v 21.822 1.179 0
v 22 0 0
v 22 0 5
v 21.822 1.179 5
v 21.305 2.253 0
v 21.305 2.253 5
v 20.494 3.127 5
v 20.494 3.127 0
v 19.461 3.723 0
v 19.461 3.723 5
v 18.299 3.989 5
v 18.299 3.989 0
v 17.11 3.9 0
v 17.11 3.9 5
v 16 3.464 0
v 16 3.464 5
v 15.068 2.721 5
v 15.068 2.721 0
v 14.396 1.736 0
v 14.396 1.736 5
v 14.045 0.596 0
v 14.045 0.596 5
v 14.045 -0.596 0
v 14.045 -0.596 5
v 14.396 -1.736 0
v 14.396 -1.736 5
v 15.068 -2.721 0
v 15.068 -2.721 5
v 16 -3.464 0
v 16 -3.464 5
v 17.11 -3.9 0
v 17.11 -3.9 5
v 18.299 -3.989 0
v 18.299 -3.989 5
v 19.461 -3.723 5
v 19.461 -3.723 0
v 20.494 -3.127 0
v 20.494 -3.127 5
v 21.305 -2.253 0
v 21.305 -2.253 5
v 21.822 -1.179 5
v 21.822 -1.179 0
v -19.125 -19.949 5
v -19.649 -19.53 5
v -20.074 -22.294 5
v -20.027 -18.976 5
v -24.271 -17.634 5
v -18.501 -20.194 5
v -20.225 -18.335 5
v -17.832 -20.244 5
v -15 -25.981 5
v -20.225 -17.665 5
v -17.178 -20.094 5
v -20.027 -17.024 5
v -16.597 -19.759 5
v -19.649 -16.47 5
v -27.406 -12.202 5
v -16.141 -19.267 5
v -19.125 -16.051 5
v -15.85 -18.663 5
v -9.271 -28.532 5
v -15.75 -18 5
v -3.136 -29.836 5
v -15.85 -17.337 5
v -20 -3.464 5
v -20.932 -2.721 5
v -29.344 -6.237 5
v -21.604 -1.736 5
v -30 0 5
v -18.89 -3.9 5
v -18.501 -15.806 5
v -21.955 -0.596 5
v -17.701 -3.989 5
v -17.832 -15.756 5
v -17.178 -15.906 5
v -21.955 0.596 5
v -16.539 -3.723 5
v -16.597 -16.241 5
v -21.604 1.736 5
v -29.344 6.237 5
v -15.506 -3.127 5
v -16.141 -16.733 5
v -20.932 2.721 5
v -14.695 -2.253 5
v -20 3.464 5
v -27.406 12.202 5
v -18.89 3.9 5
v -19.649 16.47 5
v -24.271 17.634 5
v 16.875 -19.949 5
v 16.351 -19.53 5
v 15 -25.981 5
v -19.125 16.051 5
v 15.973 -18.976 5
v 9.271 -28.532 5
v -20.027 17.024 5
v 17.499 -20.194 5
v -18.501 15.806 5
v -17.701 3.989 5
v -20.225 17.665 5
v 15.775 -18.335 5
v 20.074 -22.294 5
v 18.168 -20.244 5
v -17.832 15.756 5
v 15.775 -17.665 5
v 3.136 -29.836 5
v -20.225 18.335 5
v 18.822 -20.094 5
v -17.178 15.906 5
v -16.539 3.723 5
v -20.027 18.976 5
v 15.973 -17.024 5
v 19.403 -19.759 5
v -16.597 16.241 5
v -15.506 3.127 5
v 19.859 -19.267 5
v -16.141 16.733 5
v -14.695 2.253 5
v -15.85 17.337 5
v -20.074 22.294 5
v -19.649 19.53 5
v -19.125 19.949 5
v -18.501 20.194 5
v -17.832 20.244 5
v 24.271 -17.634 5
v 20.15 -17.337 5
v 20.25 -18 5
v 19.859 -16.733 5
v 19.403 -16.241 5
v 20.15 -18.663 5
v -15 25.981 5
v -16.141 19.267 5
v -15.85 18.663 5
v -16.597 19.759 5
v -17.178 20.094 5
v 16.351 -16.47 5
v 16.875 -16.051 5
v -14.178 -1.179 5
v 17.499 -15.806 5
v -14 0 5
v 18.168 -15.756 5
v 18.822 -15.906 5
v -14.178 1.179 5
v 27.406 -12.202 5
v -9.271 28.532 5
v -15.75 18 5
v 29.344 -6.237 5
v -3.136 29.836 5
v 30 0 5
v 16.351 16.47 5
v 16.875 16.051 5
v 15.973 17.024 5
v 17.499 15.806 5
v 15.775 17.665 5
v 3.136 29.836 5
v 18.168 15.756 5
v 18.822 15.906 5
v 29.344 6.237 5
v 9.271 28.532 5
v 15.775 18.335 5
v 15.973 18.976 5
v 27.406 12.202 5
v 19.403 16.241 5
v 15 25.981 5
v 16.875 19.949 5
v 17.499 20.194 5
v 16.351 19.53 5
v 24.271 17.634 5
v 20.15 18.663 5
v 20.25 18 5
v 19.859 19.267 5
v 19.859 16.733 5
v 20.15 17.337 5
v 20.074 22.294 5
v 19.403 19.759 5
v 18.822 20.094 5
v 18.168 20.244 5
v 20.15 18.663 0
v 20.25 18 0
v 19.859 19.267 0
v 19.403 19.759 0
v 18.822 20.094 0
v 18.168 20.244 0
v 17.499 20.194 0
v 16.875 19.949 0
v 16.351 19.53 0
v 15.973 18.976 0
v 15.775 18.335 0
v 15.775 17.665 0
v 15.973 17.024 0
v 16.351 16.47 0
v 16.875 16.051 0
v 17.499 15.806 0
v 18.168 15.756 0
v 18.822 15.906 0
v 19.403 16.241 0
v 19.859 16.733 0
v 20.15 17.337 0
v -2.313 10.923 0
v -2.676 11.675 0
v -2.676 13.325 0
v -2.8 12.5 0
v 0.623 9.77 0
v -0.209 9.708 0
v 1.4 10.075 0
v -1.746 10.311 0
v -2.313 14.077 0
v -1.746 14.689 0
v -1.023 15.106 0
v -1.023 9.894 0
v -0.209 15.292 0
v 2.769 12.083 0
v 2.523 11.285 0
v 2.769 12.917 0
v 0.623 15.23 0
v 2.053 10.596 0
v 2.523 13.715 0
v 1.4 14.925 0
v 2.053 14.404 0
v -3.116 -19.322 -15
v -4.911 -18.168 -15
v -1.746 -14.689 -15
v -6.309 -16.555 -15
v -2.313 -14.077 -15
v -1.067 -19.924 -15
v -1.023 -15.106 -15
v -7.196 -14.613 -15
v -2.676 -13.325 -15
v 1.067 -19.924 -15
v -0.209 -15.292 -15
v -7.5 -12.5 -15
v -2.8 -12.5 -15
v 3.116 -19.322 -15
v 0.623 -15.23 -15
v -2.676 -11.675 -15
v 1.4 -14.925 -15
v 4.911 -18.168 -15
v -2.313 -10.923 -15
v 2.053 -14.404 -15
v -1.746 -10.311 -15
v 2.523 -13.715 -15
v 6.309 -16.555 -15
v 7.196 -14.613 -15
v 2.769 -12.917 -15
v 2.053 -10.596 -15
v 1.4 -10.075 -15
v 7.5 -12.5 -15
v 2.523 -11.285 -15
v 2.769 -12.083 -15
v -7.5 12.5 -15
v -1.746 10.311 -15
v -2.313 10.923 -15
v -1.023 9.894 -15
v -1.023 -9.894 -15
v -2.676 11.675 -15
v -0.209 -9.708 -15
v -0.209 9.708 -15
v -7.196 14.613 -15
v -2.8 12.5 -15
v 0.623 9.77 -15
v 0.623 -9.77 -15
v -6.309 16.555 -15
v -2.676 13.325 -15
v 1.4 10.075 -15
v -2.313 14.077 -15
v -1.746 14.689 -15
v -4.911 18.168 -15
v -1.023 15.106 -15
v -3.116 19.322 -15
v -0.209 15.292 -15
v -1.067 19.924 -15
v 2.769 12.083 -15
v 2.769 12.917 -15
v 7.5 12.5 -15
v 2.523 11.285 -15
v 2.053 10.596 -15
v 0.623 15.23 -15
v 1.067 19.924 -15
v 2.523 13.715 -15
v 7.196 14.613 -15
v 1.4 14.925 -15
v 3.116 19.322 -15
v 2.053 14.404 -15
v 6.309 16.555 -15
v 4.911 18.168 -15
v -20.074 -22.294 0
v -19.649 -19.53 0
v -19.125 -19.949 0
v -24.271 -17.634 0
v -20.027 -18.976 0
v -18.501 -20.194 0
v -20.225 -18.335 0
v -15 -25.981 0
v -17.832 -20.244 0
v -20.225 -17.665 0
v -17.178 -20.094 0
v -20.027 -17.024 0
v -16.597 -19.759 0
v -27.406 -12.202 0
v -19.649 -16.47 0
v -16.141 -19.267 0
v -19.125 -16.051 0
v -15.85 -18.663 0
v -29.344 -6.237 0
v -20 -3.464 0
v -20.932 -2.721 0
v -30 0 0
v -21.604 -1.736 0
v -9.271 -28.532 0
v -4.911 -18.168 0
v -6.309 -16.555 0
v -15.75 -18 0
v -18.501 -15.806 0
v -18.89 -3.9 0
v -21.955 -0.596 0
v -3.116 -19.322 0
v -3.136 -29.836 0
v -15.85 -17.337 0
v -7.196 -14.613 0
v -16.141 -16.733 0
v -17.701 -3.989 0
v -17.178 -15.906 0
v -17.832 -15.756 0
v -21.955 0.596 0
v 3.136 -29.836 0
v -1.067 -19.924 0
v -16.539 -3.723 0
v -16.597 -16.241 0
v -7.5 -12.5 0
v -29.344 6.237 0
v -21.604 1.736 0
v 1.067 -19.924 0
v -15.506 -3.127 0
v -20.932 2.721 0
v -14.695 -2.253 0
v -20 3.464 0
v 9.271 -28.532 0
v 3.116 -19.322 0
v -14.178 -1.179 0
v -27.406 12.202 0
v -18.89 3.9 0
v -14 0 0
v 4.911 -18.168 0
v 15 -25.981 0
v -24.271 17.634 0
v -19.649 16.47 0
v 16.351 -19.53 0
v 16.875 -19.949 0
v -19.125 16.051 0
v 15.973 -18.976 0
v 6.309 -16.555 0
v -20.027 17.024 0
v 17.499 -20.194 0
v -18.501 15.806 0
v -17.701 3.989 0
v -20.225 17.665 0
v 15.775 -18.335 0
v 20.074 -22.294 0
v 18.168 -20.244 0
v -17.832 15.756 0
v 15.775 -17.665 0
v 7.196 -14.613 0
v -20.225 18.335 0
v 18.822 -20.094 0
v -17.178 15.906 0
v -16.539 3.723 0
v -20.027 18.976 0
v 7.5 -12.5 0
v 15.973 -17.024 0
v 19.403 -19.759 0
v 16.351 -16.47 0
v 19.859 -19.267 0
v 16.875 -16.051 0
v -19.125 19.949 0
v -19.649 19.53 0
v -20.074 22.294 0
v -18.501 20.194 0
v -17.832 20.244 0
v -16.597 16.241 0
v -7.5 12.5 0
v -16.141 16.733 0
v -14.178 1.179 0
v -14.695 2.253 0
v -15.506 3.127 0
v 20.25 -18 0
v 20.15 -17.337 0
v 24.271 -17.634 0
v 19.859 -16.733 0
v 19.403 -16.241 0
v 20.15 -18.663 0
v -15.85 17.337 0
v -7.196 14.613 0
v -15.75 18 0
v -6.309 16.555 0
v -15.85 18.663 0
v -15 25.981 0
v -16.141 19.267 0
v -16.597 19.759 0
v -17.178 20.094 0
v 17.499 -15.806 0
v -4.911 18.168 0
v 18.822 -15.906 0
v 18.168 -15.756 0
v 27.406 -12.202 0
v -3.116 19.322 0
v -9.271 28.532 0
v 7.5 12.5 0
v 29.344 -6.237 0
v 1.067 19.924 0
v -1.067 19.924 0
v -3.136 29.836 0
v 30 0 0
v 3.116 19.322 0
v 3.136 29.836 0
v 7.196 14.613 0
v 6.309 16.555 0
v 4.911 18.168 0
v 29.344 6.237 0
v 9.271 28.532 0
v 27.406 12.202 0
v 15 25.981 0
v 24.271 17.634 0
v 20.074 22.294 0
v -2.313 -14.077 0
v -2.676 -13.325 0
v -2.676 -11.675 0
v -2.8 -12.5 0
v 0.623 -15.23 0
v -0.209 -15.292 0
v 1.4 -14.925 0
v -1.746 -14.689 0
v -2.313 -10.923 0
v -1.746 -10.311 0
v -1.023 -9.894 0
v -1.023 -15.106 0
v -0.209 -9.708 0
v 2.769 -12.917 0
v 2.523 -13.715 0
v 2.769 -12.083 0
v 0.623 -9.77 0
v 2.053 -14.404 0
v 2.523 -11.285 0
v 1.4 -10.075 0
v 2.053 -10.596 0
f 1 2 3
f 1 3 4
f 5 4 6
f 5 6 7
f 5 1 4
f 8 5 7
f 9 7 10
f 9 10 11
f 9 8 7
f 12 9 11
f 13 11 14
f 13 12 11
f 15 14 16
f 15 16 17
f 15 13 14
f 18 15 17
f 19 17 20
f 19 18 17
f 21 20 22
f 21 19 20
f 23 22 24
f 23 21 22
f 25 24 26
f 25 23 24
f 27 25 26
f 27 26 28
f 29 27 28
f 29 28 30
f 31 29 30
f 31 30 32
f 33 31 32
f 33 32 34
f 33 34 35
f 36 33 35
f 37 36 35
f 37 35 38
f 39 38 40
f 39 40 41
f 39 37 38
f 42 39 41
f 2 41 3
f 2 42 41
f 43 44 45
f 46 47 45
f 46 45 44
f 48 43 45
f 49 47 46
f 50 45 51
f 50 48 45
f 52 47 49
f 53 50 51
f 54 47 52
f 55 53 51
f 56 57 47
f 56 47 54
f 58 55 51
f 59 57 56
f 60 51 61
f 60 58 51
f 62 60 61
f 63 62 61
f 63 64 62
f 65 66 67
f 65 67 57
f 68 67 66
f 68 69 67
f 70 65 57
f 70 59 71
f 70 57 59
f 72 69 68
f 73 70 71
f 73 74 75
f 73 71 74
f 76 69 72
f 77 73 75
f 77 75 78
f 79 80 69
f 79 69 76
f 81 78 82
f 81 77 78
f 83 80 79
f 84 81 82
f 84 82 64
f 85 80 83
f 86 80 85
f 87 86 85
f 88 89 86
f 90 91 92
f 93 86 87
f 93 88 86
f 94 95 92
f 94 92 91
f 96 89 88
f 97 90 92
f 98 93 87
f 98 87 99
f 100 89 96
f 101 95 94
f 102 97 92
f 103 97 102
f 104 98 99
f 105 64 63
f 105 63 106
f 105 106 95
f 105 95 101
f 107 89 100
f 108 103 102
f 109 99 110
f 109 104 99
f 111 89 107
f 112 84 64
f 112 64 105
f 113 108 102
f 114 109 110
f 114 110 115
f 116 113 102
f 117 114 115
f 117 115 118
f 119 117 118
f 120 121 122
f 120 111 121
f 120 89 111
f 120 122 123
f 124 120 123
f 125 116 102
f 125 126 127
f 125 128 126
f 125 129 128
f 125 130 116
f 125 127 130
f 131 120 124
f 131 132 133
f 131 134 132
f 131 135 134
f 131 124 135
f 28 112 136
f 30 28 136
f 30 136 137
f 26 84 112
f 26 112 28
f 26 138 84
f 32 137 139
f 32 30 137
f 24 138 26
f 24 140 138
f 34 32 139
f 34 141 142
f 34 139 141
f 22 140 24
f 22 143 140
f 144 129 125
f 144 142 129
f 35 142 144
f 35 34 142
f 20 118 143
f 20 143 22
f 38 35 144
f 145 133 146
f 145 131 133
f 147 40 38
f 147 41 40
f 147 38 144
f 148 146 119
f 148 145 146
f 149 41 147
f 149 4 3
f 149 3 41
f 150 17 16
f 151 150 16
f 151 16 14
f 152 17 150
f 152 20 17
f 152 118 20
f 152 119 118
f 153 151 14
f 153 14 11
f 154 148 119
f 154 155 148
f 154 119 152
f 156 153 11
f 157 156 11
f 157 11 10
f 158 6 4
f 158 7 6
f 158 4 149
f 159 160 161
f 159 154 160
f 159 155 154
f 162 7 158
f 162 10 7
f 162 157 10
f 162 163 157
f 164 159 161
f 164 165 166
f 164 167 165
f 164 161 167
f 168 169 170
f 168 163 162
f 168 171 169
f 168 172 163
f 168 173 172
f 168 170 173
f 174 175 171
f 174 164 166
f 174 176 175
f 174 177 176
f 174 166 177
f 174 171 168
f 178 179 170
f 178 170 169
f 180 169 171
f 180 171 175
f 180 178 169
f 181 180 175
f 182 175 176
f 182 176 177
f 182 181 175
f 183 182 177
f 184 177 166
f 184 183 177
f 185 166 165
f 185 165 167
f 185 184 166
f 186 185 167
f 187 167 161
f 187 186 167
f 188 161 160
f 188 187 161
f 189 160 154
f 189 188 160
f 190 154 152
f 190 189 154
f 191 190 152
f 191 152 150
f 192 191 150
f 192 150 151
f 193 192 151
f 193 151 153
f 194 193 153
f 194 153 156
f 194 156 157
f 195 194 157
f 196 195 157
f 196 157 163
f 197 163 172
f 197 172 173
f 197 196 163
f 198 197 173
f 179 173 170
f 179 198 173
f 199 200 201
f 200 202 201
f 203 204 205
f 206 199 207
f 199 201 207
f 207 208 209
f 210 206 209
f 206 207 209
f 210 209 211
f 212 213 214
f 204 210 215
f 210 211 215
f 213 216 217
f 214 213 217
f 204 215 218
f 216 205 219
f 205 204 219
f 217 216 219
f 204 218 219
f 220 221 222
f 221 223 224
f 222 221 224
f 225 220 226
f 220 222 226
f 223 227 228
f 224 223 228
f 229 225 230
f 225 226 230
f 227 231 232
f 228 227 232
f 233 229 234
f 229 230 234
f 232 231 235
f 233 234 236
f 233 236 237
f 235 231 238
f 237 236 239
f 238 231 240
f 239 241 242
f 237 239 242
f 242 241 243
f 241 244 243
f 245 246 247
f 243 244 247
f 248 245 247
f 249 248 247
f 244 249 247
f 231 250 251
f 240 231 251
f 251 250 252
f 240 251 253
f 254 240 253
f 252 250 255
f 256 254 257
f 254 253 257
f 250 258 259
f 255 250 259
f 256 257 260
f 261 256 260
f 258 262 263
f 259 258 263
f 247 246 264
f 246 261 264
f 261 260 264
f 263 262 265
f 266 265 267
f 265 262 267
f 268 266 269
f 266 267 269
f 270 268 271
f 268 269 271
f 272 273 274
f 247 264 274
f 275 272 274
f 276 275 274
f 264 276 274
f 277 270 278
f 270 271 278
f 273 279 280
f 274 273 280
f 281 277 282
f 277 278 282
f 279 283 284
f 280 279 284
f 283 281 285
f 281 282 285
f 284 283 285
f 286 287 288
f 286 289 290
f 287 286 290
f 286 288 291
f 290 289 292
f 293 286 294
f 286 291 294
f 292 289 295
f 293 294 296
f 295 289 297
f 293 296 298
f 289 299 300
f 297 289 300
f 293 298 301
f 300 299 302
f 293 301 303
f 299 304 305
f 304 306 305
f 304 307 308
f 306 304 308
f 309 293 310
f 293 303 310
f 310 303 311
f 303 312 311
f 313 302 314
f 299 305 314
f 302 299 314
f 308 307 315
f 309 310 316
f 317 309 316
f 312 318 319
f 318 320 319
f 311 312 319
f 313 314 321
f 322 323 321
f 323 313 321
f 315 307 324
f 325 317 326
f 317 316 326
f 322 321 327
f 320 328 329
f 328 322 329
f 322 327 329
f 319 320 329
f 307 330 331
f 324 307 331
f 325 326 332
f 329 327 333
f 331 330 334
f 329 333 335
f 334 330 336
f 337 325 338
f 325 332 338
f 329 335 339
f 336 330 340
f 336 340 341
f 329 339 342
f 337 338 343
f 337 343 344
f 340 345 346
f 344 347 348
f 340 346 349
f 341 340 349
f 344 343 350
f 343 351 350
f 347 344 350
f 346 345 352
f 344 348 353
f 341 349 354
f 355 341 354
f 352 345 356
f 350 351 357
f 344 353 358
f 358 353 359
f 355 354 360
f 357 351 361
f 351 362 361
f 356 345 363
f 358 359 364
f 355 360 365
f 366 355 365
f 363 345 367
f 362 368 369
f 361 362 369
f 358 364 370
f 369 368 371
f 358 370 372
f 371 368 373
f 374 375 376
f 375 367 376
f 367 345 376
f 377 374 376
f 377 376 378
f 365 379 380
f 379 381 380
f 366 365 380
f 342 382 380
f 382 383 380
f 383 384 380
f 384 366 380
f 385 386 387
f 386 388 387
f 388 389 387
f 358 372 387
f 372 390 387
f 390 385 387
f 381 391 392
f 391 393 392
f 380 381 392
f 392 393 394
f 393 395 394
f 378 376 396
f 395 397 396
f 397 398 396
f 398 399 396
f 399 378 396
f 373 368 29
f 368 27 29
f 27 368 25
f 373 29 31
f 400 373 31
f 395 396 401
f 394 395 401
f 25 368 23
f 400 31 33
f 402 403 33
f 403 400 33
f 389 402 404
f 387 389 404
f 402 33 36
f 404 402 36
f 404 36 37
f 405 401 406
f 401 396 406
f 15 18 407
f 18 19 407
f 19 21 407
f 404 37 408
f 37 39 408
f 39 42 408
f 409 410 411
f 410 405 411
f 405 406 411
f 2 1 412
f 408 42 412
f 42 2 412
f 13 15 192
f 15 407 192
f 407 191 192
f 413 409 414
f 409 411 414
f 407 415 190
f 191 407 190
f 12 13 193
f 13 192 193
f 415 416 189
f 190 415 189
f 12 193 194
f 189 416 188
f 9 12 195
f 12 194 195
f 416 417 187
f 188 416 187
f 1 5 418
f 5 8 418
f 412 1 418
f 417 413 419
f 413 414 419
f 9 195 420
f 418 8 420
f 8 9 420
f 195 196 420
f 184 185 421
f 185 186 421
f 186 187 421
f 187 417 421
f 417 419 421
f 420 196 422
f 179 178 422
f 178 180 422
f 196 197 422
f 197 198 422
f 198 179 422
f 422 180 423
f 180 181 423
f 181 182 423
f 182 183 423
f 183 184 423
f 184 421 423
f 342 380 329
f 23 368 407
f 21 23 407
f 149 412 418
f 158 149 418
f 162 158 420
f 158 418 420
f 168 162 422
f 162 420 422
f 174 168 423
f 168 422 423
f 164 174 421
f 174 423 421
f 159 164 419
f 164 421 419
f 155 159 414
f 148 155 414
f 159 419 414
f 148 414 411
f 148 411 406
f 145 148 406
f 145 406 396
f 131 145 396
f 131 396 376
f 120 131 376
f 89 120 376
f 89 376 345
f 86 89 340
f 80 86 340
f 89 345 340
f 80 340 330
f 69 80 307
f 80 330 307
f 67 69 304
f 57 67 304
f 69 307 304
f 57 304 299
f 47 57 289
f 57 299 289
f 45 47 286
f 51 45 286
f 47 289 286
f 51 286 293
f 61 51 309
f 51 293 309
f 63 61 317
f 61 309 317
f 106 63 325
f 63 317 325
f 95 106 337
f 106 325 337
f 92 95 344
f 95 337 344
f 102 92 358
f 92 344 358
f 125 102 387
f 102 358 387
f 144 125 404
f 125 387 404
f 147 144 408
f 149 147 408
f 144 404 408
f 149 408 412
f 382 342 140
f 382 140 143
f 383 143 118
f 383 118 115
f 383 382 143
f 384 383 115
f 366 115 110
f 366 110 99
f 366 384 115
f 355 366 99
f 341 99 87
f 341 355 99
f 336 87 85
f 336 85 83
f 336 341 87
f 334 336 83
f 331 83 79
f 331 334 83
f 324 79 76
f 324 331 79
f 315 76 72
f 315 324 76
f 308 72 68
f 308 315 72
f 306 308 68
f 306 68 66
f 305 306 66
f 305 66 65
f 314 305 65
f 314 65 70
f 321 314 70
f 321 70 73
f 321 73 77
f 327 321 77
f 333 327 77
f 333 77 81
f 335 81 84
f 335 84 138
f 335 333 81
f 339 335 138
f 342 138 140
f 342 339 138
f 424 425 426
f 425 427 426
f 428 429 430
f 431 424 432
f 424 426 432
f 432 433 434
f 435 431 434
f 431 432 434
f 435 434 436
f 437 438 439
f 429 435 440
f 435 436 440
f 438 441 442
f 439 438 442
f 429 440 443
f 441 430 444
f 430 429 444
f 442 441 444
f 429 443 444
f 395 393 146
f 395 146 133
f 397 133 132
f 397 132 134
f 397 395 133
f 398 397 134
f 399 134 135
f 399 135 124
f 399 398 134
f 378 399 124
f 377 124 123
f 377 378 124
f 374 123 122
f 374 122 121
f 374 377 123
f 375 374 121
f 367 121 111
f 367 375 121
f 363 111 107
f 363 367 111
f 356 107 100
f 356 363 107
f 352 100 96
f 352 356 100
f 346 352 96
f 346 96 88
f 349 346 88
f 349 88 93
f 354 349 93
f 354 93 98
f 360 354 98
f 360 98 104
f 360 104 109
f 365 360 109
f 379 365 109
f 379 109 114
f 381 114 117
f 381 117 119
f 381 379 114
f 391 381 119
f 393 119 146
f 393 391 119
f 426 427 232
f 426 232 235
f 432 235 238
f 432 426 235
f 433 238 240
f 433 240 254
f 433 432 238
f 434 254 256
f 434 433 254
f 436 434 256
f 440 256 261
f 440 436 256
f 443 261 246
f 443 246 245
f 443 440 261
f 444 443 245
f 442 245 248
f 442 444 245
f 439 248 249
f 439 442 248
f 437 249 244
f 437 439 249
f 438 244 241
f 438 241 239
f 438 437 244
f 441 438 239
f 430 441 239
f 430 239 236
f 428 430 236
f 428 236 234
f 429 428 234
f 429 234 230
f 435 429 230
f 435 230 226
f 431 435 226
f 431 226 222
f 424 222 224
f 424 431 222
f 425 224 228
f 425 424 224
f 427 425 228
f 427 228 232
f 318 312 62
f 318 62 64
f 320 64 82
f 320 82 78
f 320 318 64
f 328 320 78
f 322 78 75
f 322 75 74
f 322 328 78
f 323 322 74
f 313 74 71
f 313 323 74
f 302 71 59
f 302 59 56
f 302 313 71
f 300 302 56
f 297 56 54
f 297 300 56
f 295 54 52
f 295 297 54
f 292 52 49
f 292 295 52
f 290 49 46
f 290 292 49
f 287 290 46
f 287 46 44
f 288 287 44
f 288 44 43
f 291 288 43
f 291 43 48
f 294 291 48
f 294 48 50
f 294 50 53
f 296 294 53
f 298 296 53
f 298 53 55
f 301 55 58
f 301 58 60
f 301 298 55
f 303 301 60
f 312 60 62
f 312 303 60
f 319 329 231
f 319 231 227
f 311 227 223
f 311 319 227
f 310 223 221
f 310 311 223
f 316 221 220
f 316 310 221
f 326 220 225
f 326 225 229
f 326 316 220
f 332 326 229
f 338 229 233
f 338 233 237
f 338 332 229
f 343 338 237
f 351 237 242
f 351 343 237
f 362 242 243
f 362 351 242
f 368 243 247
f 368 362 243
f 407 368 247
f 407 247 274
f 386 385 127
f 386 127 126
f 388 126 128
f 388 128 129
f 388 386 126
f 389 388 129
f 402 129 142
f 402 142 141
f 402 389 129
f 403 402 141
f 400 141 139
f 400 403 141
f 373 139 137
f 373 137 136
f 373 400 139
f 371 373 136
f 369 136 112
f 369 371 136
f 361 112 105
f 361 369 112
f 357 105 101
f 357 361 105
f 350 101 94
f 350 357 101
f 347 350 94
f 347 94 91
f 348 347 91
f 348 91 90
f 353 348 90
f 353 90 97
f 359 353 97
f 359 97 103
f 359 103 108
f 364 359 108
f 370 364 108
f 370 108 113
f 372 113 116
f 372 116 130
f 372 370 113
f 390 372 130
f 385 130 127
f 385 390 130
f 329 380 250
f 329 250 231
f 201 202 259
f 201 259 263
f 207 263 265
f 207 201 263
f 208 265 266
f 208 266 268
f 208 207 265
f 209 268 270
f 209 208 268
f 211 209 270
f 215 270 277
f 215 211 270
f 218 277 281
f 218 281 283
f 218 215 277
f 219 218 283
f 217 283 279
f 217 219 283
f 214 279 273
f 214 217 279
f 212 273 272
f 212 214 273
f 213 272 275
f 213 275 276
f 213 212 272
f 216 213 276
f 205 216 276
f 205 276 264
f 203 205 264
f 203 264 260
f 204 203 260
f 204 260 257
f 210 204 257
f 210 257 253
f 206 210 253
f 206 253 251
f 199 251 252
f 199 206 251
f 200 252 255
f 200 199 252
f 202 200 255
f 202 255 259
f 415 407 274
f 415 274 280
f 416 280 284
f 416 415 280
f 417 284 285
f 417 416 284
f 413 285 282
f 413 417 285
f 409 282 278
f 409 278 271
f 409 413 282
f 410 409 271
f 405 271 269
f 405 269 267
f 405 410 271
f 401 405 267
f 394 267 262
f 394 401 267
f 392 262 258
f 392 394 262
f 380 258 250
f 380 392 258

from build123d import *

# Parameters (mm, degrees)
ESQUISSE1_R        = 30
ESQUISSE1_R_2      = 2.25
ESQUISSE1_R_3      = 4
BOSS_EXTRU_1_DEPTH = 5
ESQUISSE2_R        = 2.8
BOSS_EXTRU_2_DEPTH = 15


with BuildPart() as part:
    # Esquisse1 → Boss.-Extru.1 (new body)
    with BuildSketch(Plane.XY):
        Circle(ESQUISSE1_R)
        with Locations((18, 18)):
            Circle(ESQUISSE1_R_2, mode=Mode.SUBTRACT)
        with Locations((-18, 18)):
            Circle(ESQUISSE1_R_2, mode=Mode.SUBTRACT)
        with Locations((-18, -18)):
            Circle(ESQUISSE1_R_2, mode=Mode.SUBTRACT)
        with Locations((18, -18)):
            Circle(ESQUISSE1_R_2, mode=Mode.SUBTRACT)
        with Locations((18, 0)):
            Circle(ESQUISSE1_R_3, mode=Mode.SUBTRACT)
        with Locations((-18, 0)):
            Circle(ESQUISSE1_R_3, mode=Mode.SUBTRACT)
    extrude(amount=BOSS_EXTRU_1_DEPTH)

    # Esquisse2 → Boss.-Extru.2 (add)
    with BuildSketch(Plane(origin=(0, 0, 0), x_dir=(-1, 0, 0), z_dir=(0, 0, -1))):
        with BuildLine():
            Line((7.5, 12.5), (7.5, -12.5))
            ThreePointArc((7.5, -12.5), (0, -20), (-7.5, -12.5))
            Line((-7.5, -12.5), (-7.5, 12.5))
            ThreePointArc((-7.5, 12.5), (0, 20), (7.5, 12.5))
        make_face()
        with Locations((0, 12.5)):
            Circle(ESQUISSE2_R, mode=Mode.SUBTRACT)
        with Locations((0, -12.5)):
            Circle(ESQUISSE2_R, mode=Mode.SUBTRACT)
    extrude(amount=BOSS_EXTRU_2_DEPTH)


solid = part.part
